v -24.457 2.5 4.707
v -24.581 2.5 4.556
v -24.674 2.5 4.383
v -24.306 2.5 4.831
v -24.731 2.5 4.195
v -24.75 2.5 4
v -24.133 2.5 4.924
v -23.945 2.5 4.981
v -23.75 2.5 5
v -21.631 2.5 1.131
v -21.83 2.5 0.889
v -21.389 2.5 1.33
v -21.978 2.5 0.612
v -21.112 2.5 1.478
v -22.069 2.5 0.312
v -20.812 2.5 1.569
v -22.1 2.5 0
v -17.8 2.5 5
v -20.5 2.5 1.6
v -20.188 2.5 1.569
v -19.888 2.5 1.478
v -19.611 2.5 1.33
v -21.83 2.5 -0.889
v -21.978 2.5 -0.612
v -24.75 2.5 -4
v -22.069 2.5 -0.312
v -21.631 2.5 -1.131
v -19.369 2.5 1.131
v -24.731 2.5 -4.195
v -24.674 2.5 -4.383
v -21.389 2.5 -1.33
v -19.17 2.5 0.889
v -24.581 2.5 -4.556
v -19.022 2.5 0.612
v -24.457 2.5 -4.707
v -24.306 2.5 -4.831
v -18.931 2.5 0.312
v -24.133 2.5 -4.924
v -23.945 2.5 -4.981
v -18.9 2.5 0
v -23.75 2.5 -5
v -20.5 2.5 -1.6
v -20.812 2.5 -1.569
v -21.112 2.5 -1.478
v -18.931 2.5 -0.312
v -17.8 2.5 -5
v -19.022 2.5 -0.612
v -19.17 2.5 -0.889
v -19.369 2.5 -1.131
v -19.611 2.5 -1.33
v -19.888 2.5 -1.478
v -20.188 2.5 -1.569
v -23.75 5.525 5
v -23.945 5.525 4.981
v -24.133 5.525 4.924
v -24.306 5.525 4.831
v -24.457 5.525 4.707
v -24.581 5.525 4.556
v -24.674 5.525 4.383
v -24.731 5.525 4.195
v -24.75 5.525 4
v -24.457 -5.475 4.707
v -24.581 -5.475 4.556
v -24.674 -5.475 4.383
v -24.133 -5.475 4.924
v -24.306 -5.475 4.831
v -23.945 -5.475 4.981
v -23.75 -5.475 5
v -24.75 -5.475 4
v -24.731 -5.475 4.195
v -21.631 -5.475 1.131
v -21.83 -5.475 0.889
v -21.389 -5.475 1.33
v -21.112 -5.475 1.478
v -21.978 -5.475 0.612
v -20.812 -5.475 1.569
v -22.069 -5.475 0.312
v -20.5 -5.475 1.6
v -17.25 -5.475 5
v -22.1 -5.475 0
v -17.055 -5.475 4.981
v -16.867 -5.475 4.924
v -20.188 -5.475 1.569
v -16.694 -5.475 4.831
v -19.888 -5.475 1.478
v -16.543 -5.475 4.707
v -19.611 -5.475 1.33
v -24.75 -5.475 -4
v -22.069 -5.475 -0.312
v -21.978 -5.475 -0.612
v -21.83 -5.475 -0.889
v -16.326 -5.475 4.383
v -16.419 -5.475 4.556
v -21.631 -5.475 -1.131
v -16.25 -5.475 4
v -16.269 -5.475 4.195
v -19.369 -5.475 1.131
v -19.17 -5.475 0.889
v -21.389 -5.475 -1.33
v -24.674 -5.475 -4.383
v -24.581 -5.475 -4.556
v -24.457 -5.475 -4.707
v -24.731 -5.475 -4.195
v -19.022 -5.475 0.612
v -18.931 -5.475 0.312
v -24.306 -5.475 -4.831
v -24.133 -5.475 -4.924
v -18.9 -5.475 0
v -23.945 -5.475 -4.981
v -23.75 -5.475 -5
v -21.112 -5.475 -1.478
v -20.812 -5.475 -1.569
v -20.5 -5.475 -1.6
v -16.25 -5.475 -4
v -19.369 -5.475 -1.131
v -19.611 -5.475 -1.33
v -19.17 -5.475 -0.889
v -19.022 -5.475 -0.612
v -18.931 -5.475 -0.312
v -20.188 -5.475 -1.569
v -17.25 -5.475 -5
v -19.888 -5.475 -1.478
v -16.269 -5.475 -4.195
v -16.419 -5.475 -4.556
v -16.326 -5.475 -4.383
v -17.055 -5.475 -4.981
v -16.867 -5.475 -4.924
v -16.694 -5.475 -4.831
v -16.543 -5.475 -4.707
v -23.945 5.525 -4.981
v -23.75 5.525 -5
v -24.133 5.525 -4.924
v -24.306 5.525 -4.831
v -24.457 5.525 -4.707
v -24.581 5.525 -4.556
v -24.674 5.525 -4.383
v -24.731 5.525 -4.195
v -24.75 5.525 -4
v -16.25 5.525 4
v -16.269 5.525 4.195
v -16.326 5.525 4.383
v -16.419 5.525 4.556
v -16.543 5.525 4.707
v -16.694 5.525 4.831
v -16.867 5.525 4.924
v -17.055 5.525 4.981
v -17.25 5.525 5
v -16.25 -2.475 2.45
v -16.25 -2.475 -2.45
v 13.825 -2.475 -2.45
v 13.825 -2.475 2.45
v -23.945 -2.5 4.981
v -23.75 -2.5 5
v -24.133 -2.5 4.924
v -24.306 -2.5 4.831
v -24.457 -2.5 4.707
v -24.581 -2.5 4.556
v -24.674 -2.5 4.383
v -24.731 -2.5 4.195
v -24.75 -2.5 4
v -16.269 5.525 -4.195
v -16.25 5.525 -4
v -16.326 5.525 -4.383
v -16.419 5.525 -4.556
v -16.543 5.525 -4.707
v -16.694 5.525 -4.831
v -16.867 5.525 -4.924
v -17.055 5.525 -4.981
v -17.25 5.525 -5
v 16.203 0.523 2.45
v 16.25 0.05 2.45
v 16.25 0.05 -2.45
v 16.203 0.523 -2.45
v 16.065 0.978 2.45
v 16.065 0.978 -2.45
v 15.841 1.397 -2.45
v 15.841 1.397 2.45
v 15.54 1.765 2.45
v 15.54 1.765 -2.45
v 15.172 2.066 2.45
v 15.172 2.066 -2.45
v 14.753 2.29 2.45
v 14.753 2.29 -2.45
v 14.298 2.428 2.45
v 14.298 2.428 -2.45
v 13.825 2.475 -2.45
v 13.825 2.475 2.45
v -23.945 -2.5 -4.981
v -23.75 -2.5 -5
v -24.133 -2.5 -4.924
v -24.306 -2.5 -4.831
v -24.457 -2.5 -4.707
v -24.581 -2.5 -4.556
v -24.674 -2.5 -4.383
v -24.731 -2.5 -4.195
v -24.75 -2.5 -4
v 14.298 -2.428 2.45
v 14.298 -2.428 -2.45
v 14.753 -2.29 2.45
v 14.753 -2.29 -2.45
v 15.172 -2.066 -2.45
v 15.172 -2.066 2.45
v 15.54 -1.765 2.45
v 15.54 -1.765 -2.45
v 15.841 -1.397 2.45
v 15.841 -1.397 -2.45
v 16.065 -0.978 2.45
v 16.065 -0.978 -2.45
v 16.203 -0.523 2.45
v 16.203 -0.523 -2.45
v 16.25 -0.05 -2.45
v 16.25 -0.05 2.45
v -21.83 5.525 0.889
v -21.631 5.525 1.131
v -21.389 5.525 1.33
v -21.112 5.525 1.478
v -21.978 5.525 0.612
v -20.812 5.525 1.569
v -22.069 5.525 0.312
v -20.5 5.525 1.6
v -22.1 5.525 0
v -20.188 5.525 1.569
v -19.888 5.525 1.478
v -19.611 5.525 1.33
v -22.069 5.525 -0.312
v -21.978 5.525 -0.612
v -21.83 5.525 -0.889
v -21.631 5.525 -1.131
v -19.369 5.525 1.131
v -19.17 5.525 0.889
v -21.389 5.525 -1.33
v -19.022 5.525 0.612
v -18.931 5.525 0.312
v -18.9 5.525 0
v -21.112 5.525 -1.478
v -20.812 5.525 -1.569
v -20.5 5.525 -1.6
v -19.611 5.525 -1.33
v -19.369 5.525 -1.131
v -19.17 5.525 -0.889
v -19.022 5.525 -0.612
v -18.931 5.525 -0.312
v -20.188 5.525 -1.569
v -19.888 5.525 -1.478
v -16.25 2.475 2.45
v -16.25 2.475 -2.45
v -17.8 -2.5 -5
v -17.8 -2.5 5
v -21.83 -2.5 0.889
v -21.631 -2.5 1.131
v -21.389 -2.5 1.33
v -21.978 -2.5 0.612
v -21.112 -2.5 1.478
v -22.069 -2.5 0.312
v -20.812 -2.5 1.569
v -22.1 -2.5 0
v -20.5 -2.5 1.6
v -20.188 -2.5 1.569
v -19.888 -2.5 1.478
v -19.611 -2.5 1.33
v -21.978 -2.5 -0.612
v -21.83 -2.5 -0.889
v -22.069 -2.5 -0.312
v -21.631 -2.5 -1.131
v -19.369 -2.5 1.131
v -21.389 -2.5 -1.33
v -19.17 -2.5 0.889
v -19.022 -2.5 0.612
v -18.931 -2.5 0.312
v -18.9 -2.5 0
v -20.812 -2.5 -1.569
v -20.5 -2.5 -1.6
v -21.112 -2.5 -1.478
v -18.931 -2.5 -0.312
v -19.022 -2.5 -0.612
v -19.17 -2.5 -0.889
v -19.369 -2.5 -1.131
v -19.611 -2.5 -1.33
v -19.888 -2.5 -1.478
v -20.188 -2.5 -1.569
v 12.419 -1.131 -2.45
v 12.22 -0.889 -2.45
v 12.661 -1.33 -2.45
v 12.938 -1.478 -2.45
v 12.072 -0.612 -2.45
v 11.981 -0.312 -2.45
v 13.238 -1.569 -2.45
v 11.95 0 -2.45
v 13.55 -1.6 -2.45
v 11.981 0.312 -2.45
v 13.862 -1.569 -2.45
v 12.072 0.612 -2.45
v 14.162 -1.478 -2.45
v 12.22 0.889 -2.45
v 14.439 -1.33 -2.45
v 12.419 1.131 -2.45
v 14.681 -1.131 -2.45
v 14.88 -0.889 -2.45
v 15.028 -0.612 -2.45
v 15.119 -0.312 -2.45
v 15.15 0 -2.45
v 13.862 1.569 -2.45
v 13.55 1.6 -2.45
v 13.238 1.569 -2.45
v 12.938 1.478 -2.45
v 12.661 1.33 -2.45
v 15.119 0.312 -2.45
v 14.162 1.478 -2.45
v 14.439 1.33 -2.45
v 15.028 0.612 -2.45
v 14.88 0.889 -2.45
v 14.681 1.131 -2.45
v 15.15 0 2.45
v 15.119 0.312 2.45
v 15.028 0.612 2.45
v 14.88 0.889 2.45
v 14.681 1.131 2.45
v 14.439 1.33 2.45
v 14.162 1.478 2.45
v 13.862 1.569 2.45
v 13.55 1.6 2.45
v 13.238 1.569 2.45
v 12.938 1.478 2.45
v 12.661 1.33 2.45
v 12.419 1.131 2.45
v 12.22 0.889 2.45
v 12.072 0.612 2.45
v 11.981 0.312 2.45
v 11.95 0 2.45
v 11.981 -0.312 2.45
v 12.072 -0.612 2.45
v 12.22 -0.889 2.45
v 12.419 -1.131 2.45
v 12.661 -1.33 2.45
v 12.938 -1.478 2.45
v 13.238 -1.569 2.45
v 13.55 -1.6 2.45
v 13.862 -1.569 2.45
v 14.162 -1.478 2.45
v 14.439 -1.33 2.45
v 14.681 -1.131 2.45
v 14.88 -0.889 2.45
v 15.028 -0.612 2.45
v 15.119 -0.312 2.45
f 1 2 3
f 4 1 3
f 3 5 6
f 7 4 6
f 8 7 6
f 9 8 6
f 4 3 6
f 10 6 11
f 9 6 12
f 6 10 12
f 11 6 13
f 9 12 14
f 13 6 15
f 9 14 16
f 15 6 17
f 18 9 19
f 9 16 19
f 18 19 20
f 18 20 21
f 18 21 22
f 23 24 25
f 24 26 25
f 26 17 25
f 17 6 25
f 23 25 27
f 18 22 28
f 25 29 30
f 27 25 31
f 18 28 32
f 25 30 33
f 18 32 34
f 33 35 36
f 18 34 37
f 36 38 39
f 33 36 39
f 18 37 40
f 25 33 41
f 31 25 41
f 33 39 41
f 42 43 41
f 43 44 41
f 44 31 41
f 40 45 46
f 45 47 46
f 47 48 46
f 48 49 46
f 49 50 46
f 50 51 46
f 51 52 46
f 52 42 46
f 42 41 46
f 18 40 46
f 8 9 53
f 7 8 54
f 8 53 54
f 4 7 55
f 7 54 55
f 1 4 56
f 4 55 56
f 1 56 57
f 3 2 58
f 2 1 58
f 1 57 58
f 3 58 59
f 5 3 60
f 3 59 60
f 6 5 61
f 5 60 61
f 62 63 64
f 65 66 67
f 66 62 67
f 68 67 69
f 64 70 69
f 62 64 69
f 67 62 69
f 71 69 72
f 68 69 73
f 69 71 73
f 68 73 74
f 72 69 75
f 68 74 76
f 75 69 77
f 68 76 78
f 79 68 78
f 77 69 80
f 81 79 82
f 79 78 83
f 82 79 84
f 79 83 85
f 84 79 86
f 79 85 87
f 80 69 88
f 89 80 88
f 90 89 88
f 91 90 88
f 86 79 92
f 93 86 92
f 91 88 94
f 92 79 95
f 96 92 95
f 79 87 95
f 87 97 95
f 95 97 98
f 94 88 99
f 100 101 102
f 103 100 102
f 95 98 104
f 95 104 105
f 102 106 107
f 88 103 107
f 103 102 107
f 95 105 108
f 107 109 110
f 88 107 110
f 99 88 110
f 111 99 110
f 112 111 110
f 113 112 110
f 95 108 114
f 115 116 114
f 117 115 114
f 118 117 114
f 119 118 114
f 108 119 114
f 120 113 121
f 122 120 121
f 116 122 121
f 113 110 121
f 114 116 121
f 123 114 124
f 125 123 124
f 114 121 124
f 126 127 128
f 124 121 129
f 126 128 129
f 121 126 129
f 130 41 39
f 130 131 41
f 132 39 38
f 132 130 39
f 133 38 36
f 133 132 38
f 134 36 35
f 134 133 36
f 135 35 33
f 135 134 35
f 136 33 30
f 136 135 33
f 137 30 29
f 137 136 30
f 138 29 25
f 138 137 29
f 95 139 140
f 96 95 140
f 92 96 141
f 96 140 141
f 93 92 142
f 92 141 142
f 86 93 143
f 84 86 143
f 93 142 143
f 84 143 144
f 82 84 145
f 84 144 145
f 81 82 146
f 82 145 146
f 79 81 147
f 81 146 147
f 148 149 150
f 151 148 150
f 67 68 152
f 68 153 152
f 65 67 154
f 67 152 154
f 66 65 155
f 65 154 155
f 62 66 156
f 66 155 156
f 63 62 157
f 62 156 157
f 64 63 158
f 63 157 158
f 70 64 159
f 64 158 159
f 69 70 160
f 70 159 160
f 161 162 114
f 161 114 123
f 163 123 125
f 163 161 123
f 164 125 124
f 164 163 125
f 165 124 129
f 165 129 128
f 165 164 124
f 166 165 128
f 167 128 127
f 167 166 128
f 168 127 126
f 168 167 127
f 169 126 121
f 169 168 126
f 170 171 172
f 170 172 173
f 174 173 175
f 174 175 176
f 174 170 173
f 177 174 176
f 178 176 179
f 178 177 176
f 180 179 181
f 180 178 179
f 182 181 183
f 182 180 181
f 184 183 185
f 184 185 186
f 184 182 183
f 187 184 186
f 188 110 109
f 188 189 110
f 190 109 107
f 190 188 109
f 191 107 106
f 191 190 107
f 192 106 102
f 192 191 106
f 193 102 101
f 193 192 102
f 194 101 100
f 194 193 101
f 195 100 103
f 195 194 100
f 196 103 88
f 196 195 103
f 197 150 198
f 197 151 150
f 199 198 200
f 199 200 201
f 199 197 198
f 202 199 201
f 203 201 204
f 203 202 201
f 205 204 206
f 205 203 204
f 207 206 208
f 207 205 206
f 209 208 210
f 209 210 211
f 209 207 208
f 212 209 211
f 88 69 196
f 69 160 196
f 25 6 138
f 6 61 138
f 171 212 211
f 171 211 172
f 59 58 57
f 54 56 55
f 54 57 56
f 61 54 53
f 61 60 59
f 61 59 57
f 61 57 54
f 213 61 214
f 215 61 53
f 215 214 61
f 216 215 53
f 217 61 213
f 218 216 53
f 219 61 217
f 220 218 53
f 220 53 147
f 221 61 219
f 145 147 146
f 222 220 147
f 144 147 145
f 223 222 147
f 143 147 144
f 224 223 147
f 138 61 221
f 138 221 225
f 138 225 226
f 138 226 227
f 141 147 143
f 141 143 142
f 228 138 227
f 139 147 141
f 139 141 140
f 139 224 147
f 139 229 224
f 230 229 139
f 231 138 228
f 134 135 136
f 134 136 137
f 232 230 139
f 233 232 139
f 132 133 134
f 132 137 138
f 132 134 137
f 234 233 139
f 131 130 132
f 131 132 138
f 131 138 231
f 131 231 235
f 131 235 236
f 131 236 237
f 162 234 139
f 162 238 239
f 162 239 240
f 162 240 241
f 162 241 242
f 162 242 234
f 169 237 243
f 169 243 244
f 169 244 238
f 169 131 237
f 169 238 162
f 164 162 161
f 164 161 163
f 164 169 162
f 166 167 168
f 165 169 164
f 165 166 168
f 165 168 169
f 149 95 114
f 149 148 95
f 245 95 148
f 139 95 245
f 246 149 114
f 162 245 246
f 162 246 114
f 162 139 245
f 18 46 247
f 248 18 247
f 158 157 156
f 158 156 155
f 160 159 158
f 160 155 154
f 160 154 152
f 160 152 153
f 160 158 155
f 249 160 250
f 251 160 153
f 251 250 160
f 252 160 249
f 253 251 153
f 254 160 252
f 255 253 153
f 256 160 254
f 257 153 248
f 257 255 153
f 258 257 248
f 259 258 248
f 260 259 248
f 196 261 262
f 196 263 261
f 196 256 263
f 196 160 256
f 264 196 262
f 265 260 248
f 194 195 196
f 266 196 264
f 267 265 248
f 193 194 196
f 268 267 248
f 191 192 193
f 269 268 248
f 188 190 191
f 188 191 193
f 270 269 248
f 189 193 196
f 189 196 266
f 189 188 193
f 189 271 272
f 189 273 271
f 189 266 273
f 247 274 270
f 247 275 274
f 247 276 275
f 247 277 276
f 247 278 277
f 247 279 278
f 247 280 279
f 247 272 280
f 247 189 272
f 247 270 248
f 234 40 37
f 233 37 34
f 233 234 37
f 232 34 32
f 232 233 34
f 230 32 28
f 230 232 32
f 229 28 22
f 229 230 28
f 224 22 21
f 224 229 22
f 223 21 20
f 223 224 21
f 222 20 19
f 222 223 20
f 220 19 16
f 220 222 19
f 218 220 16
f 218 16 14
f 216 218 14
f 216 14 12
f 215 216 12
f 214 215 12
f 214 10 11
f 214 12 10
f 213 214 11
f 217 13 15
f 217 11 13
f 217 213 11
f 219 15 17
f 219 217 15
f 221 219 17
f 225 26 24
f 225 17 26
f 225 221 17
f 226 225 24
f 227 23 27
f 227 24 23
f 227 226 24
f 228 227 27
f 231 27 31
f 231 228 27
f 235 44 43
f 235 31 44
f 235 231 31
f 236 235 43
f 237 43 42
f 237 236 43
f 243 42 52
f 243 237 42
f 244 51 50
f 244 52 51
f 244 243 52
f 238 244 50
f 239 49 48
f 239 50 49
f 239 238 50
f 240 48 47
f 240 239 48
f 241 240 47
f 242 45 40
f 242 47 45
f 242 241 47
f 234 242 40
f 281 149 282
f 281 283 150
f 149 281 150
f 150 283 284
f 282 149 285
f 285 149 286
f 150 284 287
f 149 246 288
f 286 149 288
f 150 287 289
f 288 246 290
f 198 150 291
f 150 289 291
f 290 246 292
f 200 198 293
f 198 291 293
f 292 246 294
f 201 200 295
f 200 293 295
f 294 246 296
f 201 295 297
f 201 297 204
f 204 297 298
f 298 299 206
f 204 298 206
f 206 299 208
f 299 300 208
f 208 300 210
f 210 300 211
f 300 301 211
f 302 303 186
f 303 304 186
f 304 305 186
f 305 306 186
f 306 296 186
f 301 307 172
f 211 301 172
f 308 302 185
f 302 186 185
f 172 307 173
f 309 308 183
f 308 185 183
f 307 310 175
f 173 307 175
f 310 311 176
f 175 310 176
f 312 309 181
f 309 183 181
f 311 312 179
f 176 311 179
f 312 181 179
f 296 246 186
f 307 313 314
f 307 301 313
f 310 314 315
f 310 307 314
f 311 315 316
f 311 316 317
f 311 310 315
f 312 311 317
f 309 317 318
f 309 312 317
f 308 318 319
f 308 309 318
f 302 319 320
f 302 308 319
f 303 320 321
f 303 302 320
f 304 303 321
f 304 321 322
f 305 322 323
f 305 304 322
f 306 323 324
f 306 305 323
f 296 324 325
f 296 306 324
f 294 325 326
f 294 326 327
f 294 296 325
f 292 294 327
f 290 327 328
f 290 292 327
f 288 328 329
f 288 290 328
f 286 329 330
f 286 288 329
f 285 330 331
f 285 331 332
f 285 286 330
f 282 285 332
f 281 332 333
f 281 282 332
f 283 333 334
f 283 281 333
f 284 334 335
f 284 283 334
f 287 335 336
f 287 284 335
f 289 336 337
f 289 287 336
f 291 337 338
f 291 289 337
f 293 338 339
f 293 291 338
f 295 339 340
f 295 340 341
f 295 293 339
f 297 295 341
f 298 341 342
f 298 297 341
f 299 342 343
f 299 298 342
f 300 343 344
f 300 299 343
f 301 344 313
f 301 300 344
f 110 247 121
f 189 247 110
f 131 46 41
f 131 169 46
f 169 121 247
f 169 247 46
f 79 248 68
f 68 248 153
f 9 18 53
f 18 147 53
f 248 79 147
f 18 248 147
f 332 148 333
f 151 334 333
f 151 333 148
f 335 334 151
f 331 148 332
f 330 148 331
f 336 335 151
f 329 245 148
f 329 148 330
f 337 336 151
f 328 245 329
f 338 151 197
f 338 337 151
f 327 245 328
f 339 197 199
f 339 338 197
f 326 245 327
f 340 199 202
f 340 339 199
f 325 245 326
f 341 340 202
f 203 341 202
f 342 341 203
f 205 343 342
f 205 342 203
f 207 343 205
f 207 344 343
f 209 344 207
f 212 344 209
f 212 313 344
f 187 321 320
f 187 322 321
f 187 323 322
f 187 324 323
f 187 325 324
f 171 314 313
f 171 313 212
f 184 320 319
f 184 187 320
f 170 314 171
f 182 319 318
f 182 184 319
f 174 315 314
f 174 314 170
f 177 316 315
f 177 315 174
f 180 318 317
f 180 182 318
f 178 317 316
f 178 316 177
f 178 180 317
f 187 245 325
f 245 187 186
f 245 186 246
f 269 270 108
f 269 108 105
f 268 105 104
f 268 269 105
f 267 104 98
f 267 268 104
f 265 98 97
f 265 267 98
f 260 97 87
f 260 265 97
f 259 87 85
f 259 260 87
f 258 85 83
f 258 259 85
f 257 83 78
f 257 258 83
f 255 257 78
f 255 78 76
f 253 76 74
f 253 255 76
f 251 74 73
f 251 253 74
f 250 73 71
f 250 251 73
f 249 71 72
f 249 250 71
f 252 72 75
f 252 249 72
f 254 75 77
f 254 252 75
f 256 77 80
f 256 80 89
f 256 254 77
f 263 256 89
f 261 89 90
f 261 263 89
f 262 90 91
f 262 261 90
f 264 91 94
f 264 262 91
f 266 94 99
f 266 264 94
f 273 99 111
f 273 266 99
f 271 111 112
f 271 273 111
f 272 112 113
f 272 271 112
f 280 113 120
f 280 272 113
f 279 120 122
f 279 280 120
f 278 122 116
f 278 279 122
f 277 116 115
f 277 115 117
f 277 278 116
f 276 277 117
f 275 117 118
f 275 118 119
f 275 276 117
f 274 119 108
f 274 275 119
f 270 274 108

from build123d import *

# Parameters (mm, degrees)
F0_R      = 1.6
F1_DEPTH  = 2.45
F4_DEPTH  = 8
F6_R      = 1.6
F7_DEPTH  = 25
F8_DEPTH  = 11
F9_W      = 7.5
F9_H      = 2.5
F10_DEPTH = 14.29


with BuildPart() as f1:
    # F0 (on Top) → F1 (new body)
    with BuildSketch(Plane.XY):
        with BuildLine():
            Line((-6.325, -2.475), (13.825, -2.475))
            ThreePointArc((13.825, -2.475), (15.5397339444, -1.7647339444), (16.25, -0.05))
            Line((16.25, -0.05), (16.25, 0.05))
            ThreePointArc((16.25, 0.05), (15.5397339444, 1.7647339444), (13.825, 2.475))
            Line((13.825, 2.475), (-6.325, 2.475))
            Line((-6.325, 2.475), (-8.75, 2.475))
            Line((-8.75, 2.475), (-13.825, 2.475))
            Line((-13.825, 2.475), (-16.25, 2.475))
            Line((-16.25, 2.475), (-16.25, -2.475))
            Line((-16.25, -2.475), (-13.825, -2.475))
            Line((-13.825, -2.475), (-6.325, -2.475))
        make_face()
        with Locations((13.55, 0)):
            Circle(F0_R, mode=Mode.SUBTRACT)
    extrude(amount=F1_DEPTH)

    # F2: F1 across plane


with BuildPart() as f1_1:
    add(f1.part)
    add(f1.part.mirror(Plane.XY))

    # F3 (on face) → F4 (join)
    with BuildSketch(Plane.XZ.offset(2.475)):
        with BuildLine():
            Line((-24.75, 0), (-16.25, 0))
            Line((-16.25, 0), (-16.25, 2.45))
            Line((-16.25, 2.45), (-16.25, 4))
            ThreePointArc((-16.25, 4), (-16.5428932188, 4.7071067812), (-17.25, 5))
            Line((-17.25, 5), (-23.75, 5))
            ThreePointArc((-23.75, 5), (-24.4571067812, 4.7071067812), (-24.75, 4))
            Line((-24.75, 4), (-24.75, 0))
        make_face()
    extrude(amount=-F4_DEPTH)

    # F5: F1 across plane


with BuildPart() as f1_2:
    add(f1_1.part)
    add(f1_1.part.mirror(Plane.XY))

    # F6 (on face) → F7 (cut)
    with BuildSketch(Plane.XZ.offset(2.475)):
        with Locations((-20.5, 0)):
            Circle(F6_R)
    extrude(amount=-F7_DEPTH, mode=Mode.SUBTRACT)

    # F8 (add): a face of the model
    f8_faces = [f1_2.faces().sort_by_distance(p)[0] for p in [
        (-24.3643032252, 5.525, 4.6143032252),
    ]]
    extrude(f8_faces, amount=-F8_DEPTH)

    # F9 (on face) → F10 (cut)
    with BuildSketch(Plane(origin=(0, 0, -5), x_dir=(1, 0, 0), z_dir=(0, 0, -1))):
        with Locations((-21.55, 1.25)):
            Rectangle(F9_W, F9_H)
        with Locations((-21.55, -1.25)):
            Rectangle(F9_W, F9_H)
    extrude(amount=-F10_DEPTH, mode=Mode.SUBTRACT)


solid = f1_2.part
